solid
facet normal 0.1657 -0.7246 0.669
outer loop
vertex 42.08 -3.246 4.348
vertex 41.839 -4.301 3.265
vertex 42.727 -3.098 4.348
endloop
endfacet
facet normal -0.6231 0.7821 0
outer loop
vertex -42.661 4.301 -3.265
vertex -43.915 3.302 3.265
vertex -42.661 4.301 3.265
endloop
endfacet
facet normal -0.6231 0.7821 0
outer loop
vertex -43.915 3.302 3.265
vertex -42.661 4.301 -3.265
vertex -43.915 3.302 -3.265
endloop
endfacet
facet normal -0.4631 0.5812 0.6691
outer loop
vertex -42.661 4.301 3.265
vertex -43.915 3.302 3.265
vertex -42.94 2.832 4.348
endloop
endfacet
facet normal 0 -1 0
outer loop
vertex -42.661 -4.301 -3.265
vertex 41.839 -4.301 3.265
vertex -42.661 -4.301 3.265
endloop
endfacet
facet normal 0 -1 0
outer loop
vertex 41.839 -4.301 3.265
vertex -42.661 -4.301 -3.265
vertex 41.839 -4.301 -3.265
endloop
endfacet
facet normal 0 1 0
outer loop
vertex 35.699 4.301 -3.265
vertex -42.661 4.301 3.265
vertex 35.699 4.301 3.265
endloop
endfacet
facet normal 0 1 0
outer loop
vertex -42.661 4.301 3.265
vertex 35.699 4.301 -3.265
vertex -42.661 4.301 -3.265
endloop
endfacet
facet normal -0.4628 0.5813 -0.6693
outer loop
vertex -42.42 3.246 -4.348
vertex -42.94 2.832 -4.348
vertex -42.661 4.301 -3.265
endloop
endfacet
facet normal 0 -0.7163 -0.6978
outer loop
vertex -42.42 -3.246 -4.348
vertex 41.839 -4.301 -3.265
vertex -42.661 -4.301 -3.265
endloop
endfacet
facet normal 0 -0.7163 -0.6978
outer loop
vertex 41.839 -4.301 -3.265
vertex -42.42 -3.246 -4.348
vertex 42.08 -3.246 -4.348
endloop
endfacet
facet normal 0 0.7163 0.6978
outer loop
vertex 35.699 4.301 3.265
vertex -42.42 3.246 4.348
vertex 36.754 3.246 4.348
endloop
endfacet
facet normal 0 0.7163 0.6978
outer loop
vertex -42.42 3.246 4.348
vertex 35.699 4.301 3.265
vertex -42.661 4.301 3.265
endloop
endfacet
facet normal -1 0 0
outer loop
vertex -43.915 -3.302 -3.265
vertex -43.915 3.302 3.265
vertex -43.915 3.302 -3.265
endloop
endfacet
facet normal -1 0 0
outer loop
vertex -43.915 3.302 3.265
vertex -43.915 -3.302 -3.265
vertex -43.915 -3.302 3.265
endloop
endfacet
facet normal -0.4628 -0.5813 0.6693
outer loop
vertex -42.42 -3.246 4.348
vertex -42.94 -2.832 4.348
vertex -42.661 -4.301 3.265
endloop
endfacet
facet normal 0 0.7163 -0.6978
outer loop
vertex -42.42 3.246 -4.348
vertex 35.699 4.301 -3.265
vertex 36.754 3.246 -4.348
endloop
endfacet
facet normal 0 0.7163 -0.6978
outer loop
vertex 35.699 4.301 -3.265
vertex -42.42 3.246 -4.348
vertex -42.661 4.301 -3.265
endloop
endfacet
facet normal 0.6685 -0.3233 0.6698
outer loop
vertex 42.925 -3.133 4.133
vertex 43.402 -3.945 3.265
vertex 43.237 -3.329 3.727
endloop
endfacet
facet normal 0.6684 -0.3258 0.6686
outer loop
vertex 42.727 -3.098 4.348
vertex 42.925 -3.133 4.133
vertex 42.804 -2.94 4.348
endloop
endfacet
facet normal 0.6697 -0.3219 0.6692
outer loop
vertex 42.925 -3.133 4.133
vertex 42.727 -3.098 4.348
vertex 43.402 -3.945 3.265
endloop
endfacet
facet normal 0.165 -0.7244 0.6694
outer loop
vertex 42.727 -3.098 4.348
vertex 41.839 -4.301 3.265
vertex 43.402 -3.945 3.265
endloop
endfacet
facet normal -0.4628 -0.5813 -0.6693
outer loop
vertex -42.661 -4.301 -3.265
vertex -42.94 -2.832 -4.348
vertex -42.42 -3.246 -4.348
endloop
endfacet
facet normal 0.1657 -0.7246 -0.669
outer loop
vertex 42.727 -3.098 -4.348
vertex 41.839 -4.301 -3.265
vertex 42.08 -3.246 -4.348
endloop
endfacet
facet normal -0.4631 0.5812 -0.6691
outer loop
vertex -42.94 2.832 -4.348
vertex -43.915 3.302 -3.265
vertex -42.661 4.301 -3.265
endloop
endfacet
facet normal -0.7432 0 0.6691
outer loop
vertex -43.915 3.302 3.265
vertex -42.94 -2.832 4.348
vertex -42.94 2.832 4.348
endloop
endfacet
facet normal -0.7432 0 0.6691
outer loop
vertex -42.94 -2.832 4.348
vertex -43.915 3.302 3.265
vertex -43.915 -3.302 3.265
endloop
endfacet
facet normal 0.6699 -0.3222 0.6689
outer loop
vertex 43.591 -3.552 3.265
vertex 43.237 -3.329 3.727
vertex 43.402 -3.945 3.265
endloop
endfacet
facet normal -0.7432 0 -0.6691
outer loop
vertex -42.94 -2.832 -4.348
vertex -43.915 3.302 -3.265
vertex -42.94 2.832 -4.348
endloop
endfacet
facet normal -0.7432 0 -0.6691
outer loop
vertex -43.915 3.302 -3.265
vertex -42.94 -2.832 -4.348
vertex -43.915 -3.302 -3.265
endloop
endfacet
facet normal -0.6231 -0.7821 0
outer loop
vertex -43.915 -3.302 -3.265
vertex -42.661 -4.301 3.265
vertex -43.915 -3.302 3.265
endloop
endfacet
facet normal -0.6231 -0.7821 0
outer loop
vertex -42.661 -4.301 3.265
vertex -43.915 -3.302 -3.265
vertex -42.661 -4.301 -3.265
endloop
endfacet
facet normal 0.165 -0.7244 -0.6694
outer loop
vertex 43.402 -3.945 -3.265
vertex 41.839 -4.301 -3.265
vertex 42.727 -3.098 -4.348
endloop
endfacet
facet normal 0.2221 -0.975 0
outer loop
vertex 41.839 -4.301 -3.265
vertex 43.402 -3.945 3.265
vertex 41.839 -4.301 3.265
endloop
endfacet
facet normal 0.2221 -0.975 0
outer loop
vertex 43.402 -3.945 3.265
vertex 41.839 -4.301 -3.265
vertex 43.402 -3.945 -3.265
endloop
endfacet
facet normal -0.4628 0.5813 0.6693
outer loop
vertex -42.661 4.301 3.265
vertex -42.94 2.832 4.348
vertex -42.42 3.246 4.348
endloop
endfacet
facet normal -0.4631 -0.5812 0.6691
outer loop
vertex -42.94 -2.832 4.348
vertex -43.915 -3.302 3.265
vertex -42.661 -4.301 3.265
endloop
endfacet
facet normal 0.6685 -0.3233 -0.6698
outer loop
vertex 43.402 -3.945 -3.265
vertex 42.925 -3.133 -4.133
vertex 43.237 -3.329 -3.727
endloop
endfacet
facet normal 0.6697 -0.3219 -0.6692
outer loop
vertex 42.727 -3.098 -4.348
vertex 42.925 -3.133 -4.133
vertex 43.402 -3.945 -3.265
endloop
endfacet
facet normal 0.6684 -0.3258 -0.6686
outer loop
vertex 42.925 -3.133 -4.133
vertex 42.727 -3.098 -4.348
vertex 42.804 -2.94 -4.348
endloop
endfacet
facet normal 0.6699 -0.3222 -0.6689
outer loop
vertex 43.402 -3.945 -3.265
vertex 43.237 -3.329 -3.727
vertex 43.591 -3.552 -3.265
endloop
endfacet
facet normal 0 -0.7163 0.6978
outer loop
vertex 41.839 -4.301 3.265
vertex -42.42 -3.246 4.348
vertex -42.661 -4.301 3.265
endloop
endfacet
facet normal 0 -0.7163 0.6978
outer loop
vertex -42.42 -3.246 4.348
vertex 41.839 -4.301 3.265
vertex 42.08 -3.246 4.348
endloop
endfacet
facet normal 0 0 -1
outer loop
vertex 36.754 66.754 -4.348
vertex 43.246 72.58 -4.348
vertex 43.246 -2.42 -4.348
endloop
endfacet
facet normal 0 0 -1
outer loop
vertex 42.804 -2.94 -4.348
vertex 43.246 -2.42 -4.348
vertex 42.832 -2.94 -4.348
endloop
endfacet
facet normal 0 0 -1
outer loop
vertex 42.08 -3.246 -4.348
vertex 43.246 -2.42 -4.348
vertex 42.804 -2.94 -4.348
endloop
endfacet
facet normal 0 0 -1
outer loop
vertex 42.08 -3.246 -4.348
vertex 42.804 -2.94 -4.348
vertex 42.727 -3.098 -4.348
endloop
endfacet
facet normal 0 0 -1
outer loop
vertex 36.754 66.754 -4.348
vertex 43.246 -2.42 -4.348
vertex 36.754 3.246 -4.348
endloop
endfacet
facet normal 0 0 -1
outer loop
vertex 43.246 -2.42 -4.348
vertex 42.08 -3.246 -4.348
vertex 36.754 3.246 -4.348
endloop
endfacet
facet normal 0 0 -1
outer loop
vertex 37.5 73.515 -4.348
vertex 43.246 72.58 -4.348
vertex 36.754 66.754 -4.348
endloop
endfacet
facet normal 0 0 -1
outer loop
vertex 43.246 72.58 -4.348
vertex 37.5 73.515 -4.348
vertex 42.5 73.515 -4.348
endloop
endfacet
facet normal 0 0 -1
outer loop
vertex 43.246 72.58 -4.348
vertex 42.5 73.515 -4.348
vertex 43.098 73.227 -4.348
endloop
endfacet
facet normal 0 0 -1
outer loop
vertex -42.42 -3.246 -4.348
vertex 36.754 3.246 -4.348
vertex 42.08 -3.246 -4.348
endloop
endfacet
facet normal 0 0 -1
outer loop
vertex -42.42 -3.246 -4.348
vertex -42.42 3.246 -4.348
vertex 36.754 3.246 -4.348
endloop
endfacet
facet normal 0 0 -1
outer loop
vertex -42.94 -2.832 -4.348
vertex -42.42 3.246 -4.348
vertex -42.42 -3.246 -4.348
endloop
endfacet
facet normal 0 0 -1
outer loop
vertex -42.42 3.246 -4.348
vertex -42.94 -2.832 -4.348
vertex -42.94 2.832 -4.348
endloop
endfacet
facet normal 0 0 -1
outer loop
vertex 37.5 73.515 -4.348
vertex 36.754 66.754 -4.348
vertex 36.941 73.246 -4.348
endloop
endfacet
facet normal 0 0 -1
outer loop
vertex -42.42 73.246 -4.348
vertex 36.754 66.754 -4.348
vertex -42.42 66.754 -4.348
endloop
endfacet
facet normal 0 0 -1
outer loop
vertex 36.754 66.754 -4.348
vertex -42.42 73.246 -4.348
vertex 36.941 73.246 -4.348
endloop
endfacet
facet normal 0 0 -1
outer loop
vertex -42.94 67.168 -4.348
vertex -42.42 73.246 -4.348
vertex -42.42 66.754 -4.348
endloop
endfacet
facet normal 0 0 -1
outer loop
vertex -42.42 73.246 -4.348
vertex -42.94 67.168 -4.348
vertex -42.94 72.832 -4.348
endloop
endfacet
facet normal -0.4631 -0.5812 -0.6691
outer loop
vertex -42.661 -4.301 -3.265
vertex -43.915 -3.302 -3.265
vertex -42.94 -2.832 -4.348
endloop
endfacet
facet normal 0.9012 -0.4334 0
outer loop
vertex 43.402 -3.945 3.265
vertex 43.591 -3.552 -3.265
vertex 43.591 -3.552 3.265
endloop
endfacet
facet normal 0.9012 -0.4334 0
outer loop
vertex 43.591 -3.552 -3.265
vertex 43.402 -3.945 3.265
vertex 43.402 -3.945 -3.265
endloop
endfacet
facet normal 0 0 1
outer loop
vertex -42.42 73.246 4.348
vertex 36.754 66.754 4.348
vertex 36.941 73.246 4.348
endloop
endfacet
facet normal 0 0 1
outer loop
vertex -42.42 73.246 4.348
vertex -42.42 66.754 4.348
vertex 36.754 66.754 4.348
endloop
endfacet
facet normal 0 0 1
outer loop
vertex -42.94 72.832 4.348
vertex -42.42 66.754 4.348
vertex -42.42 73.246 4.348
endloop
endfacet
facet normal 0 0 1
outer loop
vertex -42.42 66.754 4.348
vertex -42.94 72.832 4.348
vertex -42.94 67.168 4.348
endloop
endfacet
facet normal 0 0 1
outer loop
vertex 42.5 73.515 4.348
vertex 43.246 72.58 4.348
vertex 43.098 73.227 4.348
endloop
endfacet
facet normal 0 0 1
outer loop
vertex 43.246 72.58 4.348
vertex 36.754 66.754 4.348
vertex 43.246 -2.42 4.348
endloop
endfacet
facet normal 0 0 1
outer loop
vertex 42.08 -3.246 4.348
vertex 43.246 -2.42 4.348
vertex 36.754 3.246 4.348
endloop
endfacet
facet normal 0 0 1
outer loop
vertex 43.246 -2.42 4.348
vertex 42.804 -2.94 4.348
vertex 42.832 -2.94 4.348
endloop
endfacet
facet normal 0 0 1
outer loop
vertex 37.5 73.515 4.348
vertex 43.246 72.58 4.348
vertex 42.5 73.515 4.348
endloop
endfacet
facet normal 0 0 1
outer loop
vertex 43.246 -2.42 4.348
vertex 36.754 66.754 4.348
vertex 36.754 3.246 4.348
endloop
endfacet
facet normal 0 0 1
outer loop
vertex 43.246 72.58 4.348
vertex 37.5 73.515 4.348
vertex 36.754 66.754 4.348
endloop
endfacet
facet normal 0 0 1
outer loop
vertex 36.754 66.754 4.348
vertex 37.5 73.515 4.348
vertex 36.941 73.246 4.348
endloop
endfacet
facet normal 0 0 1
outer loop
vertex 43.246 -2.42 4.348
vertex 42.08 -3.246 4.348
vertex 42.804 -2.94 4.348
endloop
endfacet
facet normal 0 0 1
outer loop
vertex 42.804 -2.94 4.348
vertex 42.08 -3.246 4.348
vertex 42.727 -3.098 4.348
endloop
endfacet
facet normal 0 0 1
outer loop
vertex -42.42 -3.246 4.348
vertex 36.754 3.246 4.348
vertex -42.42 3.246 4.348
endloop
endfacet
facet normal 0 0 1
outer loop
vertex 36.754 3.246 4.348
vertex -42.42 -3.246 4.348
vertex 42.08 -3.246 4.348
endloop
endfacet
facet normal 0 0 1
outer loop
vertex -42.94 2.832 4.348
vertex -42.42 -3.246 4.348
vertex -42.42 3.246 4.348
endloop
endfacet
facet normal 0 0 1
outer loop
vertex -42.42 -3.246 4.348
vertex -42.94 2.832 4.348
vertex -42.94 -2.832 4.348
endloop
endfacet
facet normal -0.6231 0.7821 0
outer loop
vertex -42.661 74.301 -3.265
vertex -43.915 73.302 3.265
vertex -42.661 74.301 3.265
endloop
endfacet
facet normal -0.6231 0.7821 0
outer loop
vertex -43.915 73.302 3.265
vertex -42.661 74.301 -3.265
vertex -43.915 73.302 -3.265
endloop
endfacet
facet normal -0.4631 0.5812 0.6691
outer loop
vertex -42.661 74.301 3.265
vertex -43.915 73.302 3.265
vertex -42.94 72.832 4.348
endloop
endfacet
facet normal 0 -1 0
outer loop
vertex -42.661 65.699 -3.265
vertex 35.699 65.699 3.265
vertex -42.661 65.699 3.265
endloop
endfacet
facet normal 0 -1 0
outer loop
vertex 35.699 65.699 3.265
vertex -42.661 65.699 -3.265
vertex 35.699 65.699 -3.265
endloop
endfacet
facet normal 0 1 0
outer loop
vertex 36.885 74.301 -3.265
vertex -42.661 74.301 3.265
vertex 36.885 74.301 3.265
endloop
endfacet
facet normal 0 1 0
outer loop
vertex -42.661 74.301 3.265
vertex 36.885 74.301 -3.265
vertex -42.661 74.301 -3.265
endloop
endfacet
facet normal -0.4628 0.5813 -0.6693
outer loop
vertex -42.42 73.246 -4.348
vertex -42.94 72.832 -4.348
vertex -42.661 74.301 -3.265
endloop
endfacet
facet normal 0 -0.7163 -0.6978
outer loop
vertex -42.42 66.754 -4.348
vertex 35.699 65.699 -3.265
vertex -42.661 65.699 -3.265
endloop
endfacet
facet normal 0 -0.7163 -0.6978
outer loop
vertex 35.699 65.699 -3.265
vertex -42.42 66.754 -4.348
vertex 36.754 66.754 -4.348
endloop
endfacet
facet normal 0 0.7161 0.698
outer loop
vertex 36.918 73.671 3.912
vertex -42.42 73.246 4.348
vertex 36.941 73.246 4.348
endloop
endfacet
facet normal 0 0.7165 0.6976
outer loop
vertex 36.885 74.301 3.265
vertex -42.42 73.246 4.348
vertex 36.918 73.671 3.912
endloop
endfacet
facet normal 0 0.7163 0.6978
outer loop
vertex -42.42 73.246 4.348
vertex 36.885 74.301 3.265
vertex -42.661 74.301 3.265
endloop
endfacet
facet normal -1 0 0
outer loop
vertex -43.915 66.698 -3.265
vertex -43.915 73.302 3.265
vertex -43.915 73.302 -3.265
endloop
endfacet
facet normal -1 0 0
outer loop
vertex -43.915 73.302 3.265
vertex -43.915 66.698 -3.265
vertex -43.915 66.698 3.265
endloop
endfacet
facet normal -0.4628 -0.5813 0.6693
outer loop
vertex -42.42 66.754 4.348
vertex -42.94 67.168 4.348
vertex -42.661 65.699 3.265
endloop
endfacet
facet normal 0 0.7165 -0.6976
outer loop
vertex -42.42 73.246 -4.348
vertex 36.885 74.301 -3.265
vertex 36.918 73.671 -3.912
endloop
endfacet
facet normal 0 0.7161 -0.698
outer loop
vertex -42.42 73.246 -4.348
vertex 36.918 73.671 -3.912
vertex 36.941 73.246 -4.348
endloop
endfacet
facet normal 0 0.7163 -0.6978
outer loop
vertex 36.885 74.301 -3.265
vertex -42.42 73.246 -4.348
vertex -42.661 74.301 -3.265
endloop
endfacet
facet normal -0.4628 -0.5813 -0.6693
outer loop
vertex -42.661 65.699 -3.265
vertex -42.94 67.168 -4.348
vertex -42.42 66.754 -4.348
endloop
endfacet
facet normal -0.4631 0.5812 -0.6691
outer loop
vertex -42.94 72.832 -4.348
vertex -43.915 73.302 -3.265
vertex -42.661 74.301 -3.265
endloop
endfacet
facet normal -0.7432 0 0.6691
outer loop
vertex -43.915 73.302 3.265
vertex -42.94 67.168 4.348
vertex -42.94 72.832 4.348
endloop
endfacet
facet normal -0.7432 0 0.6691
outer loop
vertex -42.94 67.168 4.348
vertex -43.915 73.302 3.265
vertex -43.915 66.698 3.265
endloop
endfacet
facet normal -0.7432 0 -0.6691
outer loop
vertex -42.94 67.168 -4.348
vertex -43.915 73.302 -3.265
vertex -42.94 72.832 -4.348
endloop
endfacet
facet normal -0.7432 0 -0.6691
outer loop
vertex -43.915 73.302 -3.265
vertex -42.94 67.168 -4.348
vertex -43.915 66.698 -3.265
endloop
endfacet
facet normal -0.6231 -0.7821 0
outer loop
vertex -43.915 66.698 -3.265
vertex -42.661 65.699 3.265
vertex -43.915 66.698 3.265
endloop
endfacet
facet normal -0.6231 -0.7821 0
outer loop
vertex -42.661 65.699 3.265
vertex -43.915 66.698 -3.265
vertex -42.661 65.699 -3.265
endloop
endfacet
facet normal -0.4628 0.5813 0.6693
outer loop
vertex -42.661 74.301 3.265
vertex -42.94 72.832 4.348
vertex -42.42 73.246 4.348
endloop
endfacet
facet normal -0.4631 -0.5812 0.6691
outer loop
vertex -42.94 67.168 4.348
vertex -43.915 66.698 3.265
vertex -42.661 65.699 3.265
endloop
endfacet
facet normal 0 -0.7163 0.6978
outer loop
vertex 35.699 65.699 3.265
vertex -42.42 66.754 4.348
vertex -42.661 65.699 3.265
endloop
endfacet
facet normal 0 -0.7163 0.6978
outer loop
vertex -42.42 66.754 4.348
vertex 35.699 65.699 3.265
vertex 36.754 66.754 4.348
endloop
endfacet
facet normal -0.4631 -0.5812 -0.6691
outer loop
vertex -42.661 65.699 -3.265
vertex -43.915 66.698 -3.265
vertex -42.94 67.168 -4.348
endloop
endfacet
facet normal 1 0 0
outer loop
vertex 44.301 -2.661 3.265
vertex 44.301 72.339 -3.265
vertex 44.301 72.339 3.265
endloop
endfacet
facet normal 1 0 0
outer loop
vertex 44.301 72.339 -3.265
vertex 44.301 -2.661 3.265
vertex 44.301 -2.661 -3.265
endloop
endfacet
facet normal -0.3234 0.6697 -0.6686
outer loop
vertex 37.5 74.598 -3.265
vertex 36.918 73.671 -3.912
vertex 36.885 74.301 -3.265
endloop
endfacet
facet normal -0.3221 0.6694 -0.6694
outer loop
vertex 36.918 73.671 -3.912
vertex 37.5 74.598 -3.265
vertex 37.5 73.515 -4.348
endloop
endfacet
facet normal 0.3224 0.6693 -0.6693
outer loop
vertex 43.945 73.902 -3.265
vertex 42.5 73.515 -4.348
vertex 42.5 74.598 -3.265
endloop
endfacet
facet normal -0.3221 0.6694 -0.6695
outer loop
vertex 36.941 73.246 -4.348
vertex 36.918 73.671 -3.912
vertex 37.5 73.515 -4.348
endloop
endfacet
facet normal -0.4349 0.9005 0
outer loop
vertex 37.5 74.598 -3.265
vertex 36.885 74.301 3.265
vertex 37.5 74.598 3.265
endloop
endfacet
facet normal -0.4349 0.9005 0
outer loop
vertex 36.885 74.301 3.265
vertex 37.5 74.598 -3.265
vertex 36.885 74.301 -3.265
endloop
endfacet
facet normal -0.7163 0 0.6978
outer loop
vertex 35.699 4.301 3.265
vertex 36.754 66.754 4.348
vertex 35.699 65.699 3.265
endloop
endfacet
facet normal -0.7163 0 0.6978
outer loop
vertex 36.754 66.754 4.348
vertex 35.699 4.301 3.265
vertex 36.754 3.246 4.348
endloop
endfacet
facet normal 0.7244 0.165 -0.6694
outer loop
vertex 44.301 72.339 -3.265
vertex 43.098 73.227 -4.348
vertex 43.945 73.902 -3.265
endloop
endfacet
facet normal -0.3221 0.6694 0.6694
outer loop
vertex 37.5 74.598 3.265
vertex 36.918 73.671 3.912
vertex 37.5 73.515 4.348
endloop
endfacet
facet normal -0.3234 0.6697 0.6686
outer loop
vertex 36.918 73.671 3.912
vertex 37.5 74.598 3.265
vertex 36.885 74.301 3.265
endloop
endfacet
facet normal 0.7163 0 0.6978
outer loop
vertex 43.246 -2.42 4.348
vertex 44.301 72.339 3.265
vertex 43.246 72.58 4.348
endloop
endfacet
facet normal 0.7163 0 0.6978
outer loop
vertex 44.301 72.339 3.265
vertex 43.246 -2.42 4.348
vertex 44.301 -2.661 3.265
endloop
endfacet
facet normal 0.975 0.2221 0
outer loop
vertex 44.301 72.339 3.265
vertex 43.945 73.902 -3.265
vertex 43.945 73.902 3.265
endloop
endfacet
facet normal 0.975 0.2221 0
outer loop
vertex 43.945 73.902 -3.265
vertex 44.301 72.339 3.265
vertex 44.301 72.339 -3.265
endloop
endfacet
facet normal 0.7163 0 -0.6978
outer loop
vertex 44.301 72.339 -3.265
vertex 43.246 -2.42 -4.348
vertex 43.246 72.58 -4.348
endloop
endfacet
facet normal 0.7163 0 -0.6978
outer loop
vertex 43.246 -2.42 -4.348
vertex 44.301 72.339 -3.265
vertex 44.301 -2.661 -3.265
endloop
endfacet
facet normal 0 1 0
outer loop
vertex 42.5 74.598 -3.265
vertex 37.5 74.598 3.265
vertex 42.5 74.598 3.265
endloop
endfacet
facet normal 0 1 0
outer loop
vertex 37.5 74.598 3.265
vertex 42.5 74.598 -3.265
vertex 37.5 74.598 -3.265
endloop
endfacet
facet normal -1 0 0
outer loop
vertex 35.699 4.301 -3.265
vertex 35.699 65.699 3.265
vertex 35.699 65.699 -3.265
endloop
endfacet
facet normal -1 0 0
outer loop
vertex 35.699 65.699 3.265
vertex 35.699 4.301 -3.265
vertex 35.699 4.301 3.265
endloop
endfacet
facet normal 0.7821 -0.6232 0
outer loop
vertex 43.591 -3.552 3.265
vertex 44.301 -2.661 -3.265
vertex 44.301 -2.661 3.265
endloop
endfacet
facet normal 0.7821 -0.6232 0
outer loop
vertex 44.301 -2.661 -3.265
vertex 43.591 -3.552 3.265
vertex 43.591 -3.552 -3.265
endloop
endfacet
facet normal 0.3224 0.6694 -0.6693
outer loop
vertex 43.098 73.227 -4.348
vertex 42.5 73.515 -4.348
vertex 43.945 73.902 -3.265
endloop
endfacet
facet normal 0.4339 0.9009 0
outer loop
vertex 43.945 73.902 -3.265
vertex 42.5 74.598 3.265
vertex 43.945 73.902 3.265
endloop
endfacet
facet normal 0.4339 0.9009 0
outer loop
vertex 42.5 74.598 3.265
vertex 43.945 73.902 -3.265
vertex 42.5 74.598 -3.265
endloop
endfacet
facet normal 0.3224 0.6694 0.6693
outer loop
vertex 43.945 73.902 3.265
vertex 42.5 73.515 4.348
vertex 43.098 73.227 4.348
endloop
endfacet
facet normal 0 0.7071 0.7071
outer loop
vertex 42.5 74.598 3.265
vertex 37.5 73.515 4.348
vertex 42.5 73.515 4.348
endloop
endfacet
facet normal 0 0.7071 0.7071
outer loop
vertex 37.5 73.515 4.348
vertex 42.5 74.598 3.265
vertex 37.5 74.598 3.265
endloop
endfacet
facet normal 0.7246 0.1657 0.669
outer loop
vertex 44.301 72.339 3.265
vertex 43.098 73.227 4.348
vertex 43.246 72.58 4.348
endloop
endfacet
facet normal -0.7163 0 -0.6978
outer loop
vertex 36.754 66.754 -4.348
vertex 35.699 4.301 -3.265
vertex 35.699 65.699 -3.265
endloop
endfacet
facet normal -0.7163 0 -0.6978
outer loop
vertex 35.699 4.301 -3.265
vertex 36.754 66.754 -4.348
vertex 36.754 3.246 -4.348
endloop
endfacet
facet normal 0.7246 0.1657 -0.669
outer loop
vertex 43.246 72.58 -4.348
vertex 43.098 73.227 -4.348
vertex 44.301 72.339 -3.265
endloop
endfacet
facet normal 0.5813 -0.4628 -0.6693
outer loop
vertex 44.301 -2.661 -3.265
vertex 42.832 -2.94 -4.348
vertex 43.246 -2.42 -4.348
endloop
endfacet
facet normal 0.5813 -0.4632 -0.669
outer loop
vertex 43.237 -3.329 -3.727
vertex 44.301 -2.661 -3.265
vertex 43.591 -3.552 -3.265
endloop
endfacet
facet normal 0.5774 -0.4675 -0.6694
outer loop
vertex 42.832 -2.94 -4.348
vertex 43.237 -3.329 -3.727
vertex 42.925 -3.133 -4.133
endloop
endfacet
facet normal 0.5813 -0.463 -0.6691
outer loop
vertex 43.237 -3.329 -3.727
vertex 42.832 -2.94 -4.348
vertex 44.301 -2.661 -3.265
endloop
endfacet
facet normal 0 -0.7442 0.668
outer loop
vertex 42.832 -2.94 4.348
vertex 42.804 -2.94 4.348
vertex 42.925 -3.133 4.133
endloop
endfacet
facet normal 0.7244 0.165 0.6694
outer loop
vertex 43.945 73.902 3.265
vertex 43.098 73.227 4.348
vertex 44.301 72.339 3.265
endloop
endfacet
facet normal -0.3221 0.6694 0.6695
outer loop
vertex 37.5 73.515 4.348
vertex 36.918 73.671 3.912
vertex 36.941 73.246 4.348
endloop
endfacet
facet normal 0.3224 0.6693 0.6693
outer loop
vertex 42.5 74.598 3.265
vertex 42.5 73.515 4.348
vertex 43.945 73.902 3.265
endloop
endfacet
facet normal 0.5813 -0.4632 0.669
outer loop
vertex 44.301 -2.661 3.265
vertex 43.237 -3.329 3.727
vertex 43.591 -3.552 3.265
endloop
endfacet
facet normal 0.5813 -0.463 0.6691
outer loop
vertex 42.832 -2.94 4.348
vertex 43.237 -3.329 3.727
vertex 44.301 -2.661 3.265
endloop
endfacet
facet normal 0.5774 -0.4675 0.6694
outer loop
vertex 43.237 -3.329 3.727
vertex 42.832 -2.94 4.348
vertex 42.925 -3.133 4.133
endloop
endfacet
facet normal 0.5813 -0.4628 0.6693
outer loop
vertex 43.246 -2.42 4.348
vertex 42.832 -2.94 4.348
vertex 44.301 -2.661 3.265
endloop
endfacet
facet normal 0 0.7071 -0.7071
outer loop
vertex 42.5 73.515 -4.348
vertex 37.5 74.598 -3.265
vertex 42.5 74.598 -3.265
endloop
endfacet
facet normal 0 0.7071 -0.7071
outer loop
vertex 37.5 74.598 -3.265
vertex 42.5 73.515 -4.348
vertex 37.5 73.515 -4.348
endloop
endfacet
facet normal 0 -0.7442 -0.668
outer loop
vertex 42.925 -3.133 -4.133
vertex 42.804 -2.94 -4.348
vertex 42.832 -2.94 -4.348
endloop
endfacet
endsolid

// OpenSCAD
// file: Rounded3dCube.scad
module RoundedCube(x,y,z,r){
minkowski() {
  cube([x,y,z],center=true);
  // rounded corners
  sphere(r);
}
}
// main file
include<Rounded3dCube.scad>
R=2;

RoundedCube(80.5+2*R,5,5,R);
translate([0,70,0])RoundedCube(80.5+2*R,5,5,R);
translate([70/2+5,80.5/2-5,0])rotate([0,0,90])RoundedCube(70+5,5,5,R);
